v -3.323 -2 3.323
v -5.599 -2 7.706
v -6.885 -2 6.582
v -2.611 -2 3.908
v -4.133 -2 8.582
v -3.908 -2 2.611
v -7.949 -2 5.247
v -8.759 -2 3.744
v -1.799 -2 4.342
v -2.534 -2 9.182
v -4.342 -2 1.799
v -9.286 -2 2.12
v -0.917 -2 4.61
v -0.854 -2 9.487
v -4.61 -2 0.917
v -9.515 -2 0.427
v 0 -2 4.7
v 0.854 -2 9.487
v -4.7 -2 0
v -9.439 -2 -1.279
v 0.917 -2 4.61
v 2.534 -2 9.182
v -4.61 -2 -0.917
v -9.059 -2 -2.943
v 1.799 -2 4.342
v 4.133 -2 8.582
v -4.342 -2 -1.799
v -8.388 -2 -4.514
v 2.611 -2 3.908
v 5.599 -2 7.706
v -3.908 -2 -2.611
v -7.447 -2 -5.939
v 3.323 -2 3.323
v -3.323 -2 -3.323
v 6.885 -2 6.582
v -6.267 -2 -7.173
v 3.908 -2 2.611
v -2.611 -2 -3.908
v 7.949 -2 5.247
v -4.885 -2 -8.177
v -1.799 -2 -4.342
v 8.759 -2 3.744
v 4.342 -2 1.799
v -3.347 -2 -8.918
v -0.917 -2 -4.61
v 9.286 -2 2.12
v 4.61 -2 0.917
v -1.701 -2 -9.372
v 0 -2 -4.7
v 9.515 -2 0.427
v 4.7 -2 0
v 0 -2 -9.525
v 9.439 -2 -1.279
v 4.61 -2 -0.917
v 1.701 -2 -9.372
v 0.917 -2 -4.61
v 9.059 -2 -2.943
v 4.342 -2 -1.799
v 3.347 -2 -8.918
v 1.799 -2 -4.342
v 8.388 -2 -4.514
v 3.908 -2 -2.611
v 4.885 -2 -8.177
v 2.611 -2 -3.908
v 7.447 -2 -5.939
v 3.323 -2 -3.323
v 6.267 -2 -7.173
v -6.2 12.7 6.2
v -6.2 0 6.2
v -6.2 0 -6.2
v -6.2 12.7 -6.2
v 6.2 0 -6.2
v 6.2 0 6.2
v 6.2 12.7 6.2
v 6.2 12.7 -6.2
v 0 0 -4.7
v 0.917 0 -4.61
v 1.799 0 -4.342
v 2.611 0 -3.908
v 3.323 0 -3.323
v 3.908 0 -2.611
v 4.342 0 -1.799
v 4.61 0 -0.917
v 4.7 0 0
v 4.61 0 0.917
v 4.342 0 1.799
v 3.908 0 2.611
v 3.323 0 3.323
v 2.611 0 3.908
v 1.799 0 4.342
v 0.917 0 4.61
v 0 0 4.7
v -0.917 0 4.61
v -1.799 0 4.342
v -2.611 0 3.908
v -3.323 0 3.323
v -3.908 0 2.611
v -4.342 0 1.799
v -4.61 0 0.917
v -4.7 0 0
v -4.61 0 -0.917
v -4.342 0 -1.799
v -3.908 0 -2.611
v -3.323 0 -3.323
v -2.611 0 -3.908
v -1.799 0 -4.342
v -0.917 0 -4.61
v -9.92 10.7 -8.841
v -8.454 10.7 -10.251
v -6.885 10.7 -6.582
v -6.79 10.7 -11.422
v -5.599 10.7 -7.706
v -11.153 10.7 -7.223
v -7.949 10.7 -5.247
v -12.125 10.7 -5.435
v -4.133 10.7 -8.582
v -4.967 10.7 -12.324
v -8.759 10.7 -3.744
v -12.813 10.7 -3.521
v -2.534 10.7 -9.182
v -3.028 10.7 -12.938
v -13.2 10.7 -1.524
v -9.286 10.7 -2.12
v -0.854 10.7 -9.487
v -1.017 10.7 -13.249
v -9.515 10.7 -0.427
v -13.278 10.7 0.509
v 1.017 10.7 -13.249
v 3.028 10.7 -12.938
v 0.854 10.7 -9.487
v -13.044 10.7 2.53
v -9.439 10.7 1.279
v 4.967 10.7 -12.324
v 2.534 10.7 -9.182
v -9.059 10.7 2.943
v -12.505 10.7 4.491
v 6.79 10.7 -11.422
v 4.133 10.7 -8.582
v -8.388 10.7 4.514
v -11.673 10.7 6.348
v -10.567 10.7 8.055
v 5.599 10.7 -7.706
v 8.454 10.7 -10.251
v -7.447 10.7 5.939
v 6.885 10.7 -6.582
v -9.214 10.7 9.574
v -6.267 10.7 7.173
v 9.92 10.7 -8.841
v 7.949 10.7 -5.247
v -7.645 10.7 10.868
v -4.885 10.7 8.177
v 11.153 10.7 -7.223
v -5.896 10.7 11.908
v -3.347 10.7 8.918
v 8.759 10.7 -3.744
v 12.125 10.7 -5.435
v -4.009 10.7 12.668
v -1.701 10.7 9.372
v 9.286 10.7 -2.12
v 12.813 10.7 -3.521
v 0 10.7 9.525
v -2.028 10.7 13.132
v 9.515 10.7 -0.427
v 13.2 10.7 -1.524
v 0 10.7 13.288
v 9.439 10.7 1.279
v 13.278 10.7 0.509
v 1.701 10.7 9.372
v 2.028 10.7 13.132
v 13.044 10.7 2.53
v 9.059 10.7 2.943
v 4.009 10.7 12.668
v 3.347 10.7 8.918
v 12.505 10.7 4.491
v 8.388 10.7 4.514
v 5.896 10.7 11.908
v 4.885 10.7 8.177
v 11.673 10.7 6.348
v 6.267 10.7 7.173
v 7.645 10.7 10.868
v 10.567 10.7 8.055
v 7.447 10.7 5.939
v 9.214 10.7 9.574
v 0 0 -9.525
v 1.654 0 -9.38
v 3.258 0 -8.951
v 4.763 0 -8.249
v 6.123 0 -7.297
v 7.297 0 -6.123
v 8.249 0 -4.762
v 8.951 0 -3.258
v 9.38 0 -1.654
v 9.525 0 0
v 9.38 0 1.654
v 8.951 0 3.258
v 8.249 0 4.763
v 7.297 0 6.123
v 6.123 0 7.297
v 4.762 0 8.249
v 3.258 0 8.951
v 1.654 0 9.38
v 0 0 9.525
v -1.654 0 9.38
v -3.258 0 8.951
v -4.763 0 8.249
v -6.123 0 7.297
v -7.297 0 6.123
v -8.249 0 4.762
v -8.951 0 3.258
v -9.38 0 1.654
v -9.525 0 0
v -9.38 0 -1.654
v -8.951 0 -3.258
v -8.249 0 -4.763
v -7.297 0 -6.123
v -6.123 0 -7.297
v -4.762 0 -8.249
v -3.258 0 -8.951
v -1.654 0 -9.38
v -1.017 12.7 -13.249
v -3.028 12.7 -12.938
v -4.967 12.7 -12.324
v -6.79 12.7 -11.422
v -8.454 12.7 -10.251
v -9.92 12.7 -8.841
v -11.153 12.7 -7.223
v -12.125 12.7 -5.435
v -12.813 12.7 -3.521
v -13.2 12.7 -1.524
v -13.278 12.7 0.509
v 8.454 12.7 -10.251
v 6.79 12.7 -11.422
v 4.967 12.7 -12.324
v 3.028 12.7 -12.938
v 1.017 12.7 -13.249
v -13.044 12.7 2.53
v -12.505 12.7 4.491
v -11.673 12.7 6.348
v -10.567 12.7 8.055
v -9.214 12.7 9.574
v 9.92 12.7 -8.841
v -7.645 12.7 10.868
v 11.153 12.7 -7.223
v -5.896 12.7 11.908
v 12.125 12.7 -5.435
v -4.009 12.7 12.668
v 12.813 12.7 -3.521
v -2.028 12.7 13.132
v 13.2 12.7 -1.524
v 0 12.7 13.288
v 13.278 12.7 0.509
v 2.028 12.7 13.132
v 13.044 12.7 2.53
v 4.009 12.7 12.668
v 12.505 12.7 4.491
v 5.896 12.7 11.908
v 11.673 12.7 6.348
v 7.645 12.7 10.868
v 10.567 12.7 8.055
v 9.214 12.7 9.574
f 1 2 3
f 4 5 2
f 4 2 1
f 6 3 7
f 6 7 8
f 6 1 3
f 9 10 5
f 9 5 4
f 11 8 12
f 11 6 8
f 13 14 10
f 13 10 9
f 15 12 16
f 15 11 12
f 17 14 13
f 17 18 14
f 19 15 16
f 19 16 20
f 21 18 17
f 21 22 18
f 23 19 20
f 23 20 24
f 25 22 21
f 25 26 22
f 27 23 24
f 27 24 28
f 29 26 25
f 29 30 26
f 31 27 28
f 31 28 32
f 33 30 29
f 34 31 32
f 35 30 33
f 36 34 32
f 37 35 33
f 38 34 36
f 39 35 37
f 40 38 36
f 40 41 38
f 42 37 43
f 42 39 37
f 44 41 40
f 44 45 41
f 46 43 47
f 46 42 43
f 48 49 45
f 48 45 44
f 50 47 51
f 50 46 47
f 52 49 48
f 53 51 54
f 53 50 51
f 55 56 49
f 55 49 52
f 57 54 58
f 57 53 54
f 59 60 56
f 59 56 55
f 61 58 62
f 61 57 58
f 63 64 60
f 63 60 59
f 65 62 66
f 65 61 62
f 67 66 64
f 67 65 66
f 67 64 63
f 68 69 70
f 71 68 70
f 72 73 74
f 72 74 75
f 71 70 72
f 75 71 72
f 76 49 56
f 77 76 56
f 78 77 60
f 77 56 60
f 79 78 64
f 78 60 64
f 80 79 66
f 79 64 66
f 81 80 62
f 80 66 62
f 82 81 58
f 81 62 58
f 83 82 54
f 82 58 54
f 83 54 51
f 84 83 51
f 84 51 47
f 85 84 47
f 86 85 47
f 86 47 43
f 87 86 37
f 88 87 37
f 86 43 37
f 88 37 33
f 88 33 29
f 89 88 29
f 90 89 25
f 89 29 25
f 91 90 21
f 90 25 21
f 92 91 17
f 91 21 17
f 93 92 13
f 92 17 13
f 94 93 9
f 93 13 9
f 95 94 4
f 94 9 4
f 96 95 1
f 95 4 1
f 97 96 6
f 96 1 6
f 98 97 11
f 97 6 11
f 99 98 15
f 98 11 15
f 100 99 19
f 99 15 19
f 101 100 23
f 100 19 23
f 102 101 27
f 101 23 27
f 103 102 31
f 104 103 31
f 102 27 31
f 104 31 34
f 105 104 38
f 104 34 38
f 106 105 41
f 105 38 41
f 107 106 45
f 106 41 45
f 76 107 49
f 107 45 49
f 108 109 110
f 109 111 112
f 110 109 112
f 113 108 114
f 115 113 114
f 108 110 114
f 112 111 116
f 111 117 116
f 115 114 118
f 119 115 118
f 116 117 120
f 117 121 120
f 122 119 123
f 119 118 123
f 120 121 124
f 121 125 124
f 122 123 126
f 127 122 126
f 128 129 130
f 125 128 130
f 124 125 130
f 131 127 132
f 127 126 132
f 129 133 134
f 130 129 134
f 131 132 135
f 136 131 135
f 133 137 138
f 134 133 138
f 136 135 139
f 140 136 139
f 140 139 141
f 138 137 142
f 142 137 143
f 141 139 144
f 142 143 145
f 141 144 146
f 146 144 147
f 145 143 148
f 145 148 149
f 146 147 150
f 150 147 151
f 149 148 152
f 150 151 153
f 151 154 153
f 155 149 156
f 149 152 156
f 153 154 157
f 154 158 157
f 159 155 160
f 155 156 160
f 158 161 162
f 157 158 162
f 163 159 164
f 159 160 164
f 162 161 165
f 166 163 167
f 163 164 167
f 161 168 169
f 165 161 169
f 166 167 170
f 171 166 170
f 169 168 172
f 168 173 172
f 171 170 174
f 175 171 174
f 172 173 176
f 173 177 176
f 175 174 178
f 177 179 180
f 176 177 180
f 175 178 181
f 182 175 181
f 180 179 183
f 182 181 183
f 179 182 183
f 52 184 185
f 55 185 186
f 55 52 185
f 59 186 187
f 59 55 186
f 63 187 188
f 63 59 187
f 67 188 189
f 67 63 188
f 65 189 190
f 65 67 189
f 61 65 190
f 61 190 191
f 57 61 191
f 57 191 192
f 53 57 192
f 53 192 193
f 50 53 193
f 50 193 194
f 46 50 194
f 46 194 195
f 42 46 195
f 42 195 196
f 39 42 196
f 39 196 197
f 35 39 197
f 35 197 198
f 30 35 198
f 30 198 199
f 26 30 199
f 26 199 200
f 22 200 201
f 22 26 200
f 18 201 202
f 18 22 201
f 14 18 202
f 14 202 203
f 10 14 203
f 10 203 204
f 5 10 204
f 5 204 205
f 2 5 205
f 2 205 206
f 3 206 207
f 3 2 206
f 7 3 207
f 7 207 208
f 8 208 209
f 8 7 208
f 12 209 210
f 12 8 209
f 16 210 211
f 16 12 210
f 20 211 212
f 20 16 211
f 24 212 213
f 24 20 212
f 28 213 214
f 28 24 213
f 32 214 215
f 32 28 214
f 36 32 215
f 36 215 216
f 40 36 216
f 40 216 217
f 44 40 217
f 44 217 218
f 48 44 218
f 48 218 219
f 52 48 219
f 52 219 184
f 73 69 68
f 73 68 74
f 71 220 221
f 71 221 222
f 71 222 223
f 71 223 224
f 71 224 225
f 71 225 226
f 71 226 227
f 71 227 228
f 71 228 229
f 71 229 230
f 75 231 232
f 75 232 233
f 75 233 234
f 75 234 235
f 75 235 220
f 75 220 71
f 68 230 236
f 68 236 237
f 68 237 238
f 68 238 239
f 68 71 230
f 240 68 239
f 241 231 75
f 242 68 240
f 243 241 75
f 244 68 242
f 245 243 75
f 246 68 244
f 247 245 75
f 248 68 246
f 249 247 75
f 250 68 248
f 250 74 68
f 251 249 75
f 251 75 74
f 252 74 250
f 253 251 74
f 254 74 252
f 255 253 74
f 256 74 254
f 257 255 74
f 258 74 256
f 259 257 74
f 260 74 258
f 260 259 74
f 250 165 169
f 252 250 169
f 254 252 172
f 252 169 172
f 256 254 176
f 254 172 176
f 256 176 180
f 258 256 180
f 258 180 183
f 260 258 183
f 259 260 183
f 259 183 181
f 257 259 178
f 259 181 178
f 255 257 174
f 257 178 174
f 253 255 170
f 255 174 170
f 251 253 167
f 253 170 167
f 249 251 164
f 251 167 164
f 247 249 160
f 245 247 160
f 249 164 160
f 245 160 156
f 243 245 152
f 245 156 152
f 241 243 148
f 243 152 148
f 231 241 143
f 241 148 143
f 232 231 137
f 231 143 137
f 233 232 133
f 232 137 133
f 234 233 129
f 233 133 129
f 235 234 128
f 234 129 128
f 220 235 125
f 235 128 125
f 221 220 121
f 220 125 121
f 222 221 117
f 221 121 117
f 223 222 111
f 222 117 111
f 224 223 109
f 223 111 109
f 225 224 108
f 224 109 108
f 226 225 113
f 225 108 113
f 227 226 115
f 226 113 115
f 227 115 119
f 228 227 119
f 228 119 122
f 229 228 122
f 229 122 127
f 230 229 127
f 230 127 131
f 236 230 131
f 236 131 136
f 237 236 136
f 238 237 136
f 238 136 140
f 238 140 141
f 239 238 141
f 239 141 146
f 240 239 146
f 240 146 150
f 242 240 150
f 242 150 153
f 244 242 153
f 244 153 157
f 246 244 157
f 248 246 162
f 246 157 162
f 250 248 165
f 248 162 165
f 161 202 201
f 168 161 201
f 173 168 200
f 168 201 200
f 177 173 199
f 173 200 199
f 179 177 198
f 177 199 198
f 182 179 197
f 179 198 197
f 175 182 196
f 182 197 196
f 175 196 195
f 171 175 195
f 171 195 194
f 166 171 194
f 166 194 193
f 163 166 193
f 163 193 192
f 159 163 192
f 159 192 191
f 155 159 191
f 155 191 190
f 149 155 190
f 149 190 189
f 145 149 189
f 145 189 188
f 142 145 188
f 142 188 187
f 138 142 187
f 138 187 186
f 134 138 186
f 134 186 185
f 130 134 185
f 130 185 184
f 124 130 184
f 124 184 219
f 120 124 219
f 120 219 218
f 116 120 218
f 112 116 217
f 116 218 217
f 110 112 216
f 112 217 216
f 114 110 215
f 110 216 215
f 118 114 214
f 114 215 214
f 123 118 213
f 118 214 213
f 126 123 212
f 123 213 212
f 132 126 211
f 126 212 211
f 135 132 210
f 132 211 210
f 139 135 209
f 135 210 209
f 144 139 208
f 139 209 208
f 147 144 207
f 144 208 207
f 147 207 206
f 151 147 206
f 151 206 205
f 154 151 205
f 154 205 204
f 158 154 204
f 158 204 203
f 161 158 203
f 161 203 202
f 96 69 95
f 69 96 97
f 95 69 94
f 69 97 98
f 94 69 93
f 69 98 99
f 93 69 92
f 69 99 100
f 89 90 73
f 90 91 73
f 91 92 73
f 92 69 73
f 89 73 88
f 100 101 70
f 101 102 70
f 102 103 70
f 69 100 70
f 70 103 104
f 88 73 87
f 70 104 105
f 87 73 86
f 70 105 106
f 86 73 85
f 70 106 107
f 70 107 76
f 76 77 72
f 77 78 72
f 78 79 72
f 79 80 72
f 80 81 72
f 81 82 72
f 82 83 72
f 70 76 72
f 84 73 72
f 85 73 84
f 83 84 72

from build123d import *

# Parameters (mm, degrees)
SKETCH1_R           = 9.525
SKETCH1_W           = 12.4
SKETCH1_H           = 12.4
BOSS_EXTRUDE1_DEPTH = 12.70000008
BOSS_EXTRUDE3_START = -2
SKETCH2_R           = 13.2875
SKETCH2_R_2         = 9.525
BOSS_EXTRUDE3_DEPTH = 2
BOSS_EXTRUDE4_START = 2
SKETCH3_R           = 9.525
SKETCH3_R_2         = 4.7
BOSS_EXTRUDE4_DEPTH = 2


with BuildPart() as part:
    # Sketch1 → Boss-Extrude1 (new body)
    with BuildSketch(Plane(origin=(0, 0, 0), x_dir=(1, 0, 0), z_dir=(0, 1, 0))):
        with Locations(Location((0, 0, 0), (0, 0, 270))):
            Circle(SKETCH1_R)
        Rectangle(SKETCH1_W, SKETCH1_H, mode=Mode.SUBTRACT)
    extrude(amount=BOSS_EXTRUDE1_DEPTH)

    # Sketch2 → Boss-Extrude3 (add)
    with BuildSketch(Plane(origin=(0, 12.70000008, 0), x_dir=(1, 0, 0), z_dir=(0, 1, 0)).offset(BOSS_EXTRUDE3_START)):
        with Locations(Location((0, 0, 0), (0, 0, 270))):
            Circle(SKETCH2_R)
        with Locations(Location((0, 0, 0), (0, 0, 270))):
            Circle(SKETCH2_R_2, mode=Mode.SUBTRACT)
    extrude(amount=BOSS_EXTRUDE3_DEPTH)

    # Sketch3 → Boss-Extrude4 (add)
    with BuildSketch(Plane.XZ.offset(BOSS_EXTRUDE4_START)):
        with Locations(Location((0, 0, 0), (0, 0, 270))):
            Circle(SKETCH3_R)
        with Locations(Location((0, 0, 0), (0, 0, 270))):
            Circle(SKETCH3_R_2, mode=Mode.SUBTRACT)
    extrude(amount=-BOSS_EXTRUDE4_DEPTH)


solid = part.part
